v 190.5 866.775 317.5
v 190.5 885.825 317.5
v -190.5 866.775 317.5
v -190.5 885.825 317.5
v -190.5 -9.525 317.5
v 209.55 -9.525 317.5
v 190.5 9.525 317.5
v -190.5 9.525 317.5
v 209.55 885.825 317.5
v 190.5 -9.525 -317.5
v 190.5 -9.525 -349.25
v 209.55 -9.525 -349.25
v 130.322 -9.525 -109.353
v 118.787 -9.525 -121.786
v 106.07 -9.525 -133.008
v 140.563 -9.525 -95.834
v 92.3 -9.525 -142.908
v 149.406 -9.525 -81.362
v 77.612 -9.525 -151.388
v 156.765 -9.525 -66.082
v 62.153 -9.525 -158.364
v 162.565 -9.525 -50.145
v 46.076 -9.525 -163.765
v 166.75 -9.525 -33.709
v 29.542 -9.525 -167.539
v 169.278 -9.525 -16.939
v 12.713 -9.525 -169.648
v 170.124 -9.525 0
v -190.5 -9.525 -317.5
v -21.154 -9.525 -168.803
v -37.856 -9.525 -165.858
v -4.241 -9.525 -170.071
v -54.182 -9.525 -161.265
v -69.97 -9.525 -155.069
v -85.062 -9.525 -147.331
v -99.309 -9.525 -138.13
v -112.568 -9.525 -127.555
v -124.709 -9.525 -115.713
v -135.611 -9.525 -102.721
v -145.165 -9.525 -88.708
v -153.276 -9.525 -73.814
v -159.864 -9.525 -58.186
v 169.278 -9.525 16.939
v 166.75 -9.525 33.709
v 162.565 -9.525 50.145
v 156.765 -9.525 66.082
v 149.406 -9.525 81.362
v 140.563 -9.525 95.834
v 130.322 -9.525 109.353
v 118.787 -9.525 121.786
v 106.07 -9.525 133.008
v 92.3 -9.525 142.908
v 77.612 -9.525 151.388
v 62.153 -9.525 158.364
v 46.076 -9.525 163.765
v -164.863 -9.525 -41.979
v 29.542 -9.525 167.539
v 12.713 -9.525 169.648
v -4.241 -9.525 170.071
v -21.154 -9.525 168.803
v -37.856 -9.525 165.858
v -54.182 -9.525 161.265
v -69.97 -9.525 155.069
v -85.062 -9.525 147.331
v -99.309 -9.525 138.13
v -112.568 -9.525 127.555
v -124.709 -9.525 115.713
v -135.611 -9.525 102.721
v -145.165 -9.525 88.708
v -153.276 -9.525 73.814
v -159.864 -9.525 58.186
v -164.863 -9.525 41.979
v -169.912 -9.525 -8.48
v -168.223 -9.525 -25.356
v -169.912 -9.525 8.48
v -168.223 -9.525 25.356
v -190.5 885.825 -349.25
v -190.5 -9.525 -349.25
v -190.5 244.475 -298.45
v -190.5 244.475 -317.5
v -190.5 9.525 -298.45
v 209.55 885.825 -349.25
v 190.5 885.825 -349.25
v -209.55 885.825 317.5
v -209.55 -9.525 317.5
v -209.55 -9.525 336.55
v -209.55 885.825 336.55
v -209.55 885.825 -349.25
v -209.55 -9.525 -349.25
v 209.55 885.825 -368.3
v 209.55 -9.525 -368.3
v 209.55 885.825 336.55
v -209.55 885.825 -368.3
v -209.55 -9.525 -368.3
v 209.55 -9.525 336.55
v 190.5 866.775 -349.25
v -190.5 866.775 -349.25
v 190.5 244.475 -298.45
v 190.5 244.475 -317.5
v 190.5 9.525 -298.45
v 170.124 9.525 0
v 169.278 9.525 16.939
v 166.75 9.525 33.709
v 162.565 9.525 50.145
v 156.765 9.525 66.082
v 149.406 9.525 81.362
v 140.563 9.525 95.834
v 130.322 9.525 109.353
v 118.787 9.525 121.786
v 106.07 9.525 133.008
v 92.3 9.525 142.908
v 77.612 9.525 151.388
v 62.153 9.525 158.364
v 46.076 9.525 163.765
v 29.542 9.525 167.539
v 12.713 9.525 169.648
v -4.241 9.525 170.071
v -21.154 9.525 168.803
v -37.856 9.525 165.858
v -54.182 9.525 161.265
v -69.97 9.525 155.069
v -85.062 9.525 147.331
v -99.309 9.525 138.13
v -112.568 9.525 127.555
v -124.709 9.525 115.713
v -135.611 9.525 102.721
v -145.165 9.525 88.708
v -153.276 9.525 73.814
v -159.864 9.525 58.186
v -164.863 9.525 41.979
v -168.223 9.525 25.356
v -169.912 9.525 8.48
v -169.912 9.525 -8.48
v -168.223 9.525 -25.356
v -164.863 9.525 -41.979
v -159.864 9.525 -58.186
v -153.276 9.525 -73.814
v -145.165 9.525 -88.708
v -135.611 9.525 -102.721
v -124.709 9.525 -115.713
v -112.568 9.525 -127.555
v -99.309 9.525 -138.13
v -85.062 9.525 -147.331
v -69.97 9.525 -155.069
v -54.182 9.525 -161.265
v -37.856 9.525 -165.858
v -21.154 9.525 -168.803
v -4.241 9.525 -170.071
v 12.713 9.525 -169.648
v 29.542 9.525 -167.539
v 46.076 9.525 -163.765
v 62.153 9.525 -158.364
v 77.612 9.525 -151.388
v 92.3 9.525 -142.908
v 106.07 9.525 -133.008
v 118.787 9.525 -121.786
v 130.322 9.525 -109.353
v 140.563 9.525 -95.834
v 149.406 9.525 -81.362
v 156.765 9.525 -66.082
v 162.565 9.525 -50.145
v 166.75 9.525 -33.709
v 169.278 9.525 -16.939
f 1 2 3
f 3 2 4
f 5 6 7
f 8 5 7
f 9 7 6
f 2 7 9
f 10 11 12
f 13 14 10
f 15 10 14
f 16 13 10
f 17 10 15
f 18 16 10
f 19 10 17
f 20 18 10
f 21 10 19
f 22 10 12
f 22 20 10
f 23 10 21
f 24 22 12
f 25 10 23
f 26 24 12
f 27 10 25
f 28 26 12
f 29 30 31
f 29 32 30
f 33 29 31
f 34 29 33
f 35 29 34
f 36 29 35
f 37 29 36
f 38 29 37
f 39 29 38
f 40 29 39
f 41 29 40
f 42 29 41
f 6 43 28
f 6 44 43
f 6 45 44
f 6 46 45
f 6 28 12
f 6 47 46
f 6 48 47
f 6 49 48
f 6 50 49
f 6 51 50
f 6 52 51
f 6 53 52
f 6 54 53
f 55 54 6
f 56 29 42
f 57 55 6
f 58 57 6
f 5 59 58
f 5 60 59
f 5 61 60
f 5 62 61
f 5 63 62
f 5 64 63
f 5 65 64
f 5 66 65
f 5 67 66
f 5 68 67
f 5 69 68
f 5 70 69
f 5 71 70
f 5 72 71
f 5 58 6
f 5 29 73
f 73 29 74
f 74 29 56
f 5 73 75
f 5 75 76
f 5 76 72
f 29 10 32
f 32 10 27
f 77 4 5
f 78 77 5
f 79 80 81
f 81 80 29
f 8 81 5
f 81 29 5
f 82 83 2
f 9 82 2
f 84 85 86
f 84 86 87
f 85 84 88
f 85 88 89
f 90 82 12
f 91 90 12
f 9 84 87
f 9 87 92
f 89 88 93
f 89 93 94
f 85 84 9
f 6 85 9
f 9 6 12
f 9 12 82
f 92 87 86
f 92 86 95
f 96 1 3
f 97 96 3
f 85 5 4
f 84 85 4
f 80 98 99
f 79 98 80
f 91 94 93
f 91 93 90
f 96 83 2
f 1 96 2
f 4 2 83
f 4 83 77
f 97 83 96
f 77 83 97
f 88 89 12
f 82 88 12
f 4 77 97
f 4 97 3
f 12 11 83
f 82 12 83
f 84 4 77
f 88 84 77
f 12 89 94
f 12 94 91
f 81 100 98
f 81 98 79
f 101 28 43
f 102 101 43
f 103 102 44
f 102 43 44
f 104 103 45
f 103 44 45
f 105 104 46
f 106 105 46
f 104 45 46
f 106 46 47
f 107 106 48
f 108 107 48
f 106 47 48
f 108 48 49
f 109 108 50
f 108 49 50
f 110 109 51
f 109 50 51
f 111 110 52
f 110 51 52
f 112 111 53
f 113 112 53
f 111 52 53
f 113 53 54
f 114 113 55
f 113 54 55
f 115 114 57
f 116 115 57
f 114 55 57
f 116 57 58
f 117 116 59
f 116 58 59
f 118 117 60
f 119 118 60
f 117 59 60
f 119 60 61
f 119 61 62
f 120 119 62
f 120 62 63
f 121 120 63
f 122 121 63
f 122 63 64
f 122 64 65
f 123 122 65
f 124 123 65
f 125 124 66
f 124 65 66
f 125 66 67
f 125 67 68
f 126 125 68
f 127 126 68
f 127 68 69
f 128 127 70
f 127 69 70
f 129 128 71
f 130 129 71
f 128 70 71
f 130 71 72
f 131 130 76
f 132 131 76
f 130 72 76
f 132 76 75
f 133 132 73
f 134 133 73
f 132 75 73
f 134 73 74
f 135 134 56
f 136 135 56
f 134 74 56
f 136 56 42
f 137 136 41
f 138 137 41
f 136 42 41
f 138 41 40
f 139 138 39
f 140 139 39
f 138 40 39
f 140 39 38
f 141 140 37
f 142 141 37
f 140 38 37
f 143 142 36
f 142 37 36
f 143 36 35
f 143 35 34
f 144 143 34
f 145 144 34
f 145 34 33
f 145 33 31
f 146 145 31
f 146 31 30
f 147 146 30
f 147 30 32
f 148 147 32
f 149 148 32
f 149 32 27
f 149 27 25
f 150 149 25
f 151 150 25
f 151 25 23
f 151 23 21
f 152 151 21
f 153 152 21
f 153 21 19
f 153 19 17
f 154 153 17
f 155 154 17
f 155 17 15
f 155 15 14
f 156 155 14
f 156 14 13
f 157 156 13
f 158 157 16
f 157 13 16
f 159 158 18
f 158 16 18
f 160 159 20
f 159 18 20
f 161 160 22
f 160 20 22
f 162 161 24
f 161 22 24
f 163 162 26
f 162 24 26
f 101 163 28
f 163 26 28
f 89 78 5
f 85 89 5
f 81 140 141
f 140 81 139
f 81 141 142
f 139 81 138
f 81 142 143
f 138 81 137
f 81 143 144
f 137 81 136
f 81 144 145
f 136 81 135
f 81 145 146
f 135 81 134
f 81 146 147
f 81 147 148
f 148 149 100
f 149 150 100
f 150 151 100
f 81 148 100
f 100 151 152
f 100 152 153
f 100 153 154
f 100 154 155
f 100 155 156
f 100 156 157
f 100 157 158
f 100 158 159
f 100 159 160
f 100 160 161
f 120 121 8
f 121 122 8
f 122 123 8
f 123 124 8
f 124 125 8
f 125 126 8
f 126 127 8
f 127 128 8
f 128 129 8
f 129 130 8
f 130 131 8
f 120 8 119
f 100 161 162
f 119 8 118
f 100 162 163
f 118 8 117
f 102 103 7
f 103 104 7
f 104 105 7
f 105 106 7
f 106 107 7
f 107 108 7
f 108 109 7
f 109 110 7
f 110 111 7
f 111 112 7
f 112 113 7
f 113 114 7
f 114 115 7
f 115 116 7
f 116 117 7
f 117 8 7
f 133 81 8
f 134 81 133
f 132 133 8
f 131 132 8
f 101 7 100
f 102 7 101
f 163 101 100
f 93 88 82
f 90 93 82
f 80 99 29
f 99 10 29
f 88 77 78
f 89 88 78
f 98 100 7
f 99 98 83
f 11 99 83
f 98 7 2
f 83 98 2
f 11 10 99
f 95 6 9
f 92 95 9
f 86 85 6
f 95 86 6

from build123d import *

# Parameters (mm, degrees)
F0_W      = 381
F0_H      = 635
F1_DEPTH  = 9.525
F2_R      = 170.1235720866
F3_DEPTH  = 19.05
F4_W      = 381
F4_H      = 19.05
F5_DEPTH  = 234.95
F7_DEPTH  = 19.05
F8_W      = 895.35
F8_H      = 666.75
F9_DEPTH  = 19.05
F10_W     = 419.1
F10_H     = 895.35
F11_DEPTH = 19.05
F12_W     = 419.1
F12_H     = 895.35
F13_DEPTH = 19.05
F14_W     = 381
F14_H     = 666.75
F15_DEPTH = 19.05


with BuildPart() as f1:
    # F0 (on Front) → F1 (new body, symmetric)
    with BuildSketch(Plane.XZ):
        Rectangle(F0_W, F0_H)
    extrude(amount=F1_DEPTH, both=True)

    # F2 (on face) → F3 (cut)
    with BuildSketch(Plane.XZ.offset(9.525)):
        Circle(F2_R)
    extrude(amount=-F3_DEPTH, mode=Mode.SUBTRACT)

    # F4 (on face) → F5 (join)
    with BuildSketch(Plane(origin=(0, 9.525, 0), x_dir=(-1, 0, 0), z_dir=(0, 1, 0))):
        with Locations((0, -307.975)):
            Rectangle(F4_W, F4_H)
    extrude(amount=F5_DEPTH)

    # F8 (on face) → F9 (join)
    with BuildSketch(Plane.YZ.offset(190.5)):
        with Locations((438.15, -15.875)):
            Rectangle(F8_W, F8_H)
    extrude(amount=F9_DEPTH)


with BuildPart() as f7:
    # F6 (on face) → F7 (new body)
    with BuildSketch(Plane(origin=(-190.5, 0, 0), x_dir=(0, -1, 0), z_dir=(-1, 0, 0))):
        Polygon((9.525, -317.5), (9.525, 317.5), (-9.525, 317.5), (-9.525, -298.45), (-244.475, -298.45), (-244.475, -317.5), align=None)
        Polygon((-9.525, -298.45), (-9.525, 317.5), (-885.825, 317.5), (-885.825, -349.25), (9.525, -349.25), (9.525, -317.5), (-244.475, -317.5), (-244.475, -298.45), align=None)
    extrude(amount=F7_DEPTH)


with BuildPart() as f11:
    # F10 (on face) → F11 (new body)
    with BuildSketch(Plane(origin=(0, 0, -349.25), x_dir=(1, 0, 0), z_dir=(0, 0, -1))):
        with Locations((0, -438.15)):
            Rectangle(F10_W, F10_H)
    extrude(amount=F11_DEPTH)


with BuildPart() as f13:
    # F12 (on face) → F13 (new body)
    with BuildSketch(Plane.XY.offset(317.5)):
        with Locations((0, 438.15)):
            Rectangle(F12_W, F12_H)
    extrude(amount=F13_DEPTH)


with BuildPart() as f15:
    # F14 (on face) → F15 (new body)
    with BuildSketch(Plane(origin=(0, 885.825, 0), x_dir=(-1, 0, 0), z_dir=(0, 1, 0))):
        with Locations((0, -15.875)):
            Rectangle(F14_W, F14_H)
    extrude(amount=-F15_DEPTH)


solid = Compound([f1.part, f7.part, f11.part, f13.part, f15.part])
